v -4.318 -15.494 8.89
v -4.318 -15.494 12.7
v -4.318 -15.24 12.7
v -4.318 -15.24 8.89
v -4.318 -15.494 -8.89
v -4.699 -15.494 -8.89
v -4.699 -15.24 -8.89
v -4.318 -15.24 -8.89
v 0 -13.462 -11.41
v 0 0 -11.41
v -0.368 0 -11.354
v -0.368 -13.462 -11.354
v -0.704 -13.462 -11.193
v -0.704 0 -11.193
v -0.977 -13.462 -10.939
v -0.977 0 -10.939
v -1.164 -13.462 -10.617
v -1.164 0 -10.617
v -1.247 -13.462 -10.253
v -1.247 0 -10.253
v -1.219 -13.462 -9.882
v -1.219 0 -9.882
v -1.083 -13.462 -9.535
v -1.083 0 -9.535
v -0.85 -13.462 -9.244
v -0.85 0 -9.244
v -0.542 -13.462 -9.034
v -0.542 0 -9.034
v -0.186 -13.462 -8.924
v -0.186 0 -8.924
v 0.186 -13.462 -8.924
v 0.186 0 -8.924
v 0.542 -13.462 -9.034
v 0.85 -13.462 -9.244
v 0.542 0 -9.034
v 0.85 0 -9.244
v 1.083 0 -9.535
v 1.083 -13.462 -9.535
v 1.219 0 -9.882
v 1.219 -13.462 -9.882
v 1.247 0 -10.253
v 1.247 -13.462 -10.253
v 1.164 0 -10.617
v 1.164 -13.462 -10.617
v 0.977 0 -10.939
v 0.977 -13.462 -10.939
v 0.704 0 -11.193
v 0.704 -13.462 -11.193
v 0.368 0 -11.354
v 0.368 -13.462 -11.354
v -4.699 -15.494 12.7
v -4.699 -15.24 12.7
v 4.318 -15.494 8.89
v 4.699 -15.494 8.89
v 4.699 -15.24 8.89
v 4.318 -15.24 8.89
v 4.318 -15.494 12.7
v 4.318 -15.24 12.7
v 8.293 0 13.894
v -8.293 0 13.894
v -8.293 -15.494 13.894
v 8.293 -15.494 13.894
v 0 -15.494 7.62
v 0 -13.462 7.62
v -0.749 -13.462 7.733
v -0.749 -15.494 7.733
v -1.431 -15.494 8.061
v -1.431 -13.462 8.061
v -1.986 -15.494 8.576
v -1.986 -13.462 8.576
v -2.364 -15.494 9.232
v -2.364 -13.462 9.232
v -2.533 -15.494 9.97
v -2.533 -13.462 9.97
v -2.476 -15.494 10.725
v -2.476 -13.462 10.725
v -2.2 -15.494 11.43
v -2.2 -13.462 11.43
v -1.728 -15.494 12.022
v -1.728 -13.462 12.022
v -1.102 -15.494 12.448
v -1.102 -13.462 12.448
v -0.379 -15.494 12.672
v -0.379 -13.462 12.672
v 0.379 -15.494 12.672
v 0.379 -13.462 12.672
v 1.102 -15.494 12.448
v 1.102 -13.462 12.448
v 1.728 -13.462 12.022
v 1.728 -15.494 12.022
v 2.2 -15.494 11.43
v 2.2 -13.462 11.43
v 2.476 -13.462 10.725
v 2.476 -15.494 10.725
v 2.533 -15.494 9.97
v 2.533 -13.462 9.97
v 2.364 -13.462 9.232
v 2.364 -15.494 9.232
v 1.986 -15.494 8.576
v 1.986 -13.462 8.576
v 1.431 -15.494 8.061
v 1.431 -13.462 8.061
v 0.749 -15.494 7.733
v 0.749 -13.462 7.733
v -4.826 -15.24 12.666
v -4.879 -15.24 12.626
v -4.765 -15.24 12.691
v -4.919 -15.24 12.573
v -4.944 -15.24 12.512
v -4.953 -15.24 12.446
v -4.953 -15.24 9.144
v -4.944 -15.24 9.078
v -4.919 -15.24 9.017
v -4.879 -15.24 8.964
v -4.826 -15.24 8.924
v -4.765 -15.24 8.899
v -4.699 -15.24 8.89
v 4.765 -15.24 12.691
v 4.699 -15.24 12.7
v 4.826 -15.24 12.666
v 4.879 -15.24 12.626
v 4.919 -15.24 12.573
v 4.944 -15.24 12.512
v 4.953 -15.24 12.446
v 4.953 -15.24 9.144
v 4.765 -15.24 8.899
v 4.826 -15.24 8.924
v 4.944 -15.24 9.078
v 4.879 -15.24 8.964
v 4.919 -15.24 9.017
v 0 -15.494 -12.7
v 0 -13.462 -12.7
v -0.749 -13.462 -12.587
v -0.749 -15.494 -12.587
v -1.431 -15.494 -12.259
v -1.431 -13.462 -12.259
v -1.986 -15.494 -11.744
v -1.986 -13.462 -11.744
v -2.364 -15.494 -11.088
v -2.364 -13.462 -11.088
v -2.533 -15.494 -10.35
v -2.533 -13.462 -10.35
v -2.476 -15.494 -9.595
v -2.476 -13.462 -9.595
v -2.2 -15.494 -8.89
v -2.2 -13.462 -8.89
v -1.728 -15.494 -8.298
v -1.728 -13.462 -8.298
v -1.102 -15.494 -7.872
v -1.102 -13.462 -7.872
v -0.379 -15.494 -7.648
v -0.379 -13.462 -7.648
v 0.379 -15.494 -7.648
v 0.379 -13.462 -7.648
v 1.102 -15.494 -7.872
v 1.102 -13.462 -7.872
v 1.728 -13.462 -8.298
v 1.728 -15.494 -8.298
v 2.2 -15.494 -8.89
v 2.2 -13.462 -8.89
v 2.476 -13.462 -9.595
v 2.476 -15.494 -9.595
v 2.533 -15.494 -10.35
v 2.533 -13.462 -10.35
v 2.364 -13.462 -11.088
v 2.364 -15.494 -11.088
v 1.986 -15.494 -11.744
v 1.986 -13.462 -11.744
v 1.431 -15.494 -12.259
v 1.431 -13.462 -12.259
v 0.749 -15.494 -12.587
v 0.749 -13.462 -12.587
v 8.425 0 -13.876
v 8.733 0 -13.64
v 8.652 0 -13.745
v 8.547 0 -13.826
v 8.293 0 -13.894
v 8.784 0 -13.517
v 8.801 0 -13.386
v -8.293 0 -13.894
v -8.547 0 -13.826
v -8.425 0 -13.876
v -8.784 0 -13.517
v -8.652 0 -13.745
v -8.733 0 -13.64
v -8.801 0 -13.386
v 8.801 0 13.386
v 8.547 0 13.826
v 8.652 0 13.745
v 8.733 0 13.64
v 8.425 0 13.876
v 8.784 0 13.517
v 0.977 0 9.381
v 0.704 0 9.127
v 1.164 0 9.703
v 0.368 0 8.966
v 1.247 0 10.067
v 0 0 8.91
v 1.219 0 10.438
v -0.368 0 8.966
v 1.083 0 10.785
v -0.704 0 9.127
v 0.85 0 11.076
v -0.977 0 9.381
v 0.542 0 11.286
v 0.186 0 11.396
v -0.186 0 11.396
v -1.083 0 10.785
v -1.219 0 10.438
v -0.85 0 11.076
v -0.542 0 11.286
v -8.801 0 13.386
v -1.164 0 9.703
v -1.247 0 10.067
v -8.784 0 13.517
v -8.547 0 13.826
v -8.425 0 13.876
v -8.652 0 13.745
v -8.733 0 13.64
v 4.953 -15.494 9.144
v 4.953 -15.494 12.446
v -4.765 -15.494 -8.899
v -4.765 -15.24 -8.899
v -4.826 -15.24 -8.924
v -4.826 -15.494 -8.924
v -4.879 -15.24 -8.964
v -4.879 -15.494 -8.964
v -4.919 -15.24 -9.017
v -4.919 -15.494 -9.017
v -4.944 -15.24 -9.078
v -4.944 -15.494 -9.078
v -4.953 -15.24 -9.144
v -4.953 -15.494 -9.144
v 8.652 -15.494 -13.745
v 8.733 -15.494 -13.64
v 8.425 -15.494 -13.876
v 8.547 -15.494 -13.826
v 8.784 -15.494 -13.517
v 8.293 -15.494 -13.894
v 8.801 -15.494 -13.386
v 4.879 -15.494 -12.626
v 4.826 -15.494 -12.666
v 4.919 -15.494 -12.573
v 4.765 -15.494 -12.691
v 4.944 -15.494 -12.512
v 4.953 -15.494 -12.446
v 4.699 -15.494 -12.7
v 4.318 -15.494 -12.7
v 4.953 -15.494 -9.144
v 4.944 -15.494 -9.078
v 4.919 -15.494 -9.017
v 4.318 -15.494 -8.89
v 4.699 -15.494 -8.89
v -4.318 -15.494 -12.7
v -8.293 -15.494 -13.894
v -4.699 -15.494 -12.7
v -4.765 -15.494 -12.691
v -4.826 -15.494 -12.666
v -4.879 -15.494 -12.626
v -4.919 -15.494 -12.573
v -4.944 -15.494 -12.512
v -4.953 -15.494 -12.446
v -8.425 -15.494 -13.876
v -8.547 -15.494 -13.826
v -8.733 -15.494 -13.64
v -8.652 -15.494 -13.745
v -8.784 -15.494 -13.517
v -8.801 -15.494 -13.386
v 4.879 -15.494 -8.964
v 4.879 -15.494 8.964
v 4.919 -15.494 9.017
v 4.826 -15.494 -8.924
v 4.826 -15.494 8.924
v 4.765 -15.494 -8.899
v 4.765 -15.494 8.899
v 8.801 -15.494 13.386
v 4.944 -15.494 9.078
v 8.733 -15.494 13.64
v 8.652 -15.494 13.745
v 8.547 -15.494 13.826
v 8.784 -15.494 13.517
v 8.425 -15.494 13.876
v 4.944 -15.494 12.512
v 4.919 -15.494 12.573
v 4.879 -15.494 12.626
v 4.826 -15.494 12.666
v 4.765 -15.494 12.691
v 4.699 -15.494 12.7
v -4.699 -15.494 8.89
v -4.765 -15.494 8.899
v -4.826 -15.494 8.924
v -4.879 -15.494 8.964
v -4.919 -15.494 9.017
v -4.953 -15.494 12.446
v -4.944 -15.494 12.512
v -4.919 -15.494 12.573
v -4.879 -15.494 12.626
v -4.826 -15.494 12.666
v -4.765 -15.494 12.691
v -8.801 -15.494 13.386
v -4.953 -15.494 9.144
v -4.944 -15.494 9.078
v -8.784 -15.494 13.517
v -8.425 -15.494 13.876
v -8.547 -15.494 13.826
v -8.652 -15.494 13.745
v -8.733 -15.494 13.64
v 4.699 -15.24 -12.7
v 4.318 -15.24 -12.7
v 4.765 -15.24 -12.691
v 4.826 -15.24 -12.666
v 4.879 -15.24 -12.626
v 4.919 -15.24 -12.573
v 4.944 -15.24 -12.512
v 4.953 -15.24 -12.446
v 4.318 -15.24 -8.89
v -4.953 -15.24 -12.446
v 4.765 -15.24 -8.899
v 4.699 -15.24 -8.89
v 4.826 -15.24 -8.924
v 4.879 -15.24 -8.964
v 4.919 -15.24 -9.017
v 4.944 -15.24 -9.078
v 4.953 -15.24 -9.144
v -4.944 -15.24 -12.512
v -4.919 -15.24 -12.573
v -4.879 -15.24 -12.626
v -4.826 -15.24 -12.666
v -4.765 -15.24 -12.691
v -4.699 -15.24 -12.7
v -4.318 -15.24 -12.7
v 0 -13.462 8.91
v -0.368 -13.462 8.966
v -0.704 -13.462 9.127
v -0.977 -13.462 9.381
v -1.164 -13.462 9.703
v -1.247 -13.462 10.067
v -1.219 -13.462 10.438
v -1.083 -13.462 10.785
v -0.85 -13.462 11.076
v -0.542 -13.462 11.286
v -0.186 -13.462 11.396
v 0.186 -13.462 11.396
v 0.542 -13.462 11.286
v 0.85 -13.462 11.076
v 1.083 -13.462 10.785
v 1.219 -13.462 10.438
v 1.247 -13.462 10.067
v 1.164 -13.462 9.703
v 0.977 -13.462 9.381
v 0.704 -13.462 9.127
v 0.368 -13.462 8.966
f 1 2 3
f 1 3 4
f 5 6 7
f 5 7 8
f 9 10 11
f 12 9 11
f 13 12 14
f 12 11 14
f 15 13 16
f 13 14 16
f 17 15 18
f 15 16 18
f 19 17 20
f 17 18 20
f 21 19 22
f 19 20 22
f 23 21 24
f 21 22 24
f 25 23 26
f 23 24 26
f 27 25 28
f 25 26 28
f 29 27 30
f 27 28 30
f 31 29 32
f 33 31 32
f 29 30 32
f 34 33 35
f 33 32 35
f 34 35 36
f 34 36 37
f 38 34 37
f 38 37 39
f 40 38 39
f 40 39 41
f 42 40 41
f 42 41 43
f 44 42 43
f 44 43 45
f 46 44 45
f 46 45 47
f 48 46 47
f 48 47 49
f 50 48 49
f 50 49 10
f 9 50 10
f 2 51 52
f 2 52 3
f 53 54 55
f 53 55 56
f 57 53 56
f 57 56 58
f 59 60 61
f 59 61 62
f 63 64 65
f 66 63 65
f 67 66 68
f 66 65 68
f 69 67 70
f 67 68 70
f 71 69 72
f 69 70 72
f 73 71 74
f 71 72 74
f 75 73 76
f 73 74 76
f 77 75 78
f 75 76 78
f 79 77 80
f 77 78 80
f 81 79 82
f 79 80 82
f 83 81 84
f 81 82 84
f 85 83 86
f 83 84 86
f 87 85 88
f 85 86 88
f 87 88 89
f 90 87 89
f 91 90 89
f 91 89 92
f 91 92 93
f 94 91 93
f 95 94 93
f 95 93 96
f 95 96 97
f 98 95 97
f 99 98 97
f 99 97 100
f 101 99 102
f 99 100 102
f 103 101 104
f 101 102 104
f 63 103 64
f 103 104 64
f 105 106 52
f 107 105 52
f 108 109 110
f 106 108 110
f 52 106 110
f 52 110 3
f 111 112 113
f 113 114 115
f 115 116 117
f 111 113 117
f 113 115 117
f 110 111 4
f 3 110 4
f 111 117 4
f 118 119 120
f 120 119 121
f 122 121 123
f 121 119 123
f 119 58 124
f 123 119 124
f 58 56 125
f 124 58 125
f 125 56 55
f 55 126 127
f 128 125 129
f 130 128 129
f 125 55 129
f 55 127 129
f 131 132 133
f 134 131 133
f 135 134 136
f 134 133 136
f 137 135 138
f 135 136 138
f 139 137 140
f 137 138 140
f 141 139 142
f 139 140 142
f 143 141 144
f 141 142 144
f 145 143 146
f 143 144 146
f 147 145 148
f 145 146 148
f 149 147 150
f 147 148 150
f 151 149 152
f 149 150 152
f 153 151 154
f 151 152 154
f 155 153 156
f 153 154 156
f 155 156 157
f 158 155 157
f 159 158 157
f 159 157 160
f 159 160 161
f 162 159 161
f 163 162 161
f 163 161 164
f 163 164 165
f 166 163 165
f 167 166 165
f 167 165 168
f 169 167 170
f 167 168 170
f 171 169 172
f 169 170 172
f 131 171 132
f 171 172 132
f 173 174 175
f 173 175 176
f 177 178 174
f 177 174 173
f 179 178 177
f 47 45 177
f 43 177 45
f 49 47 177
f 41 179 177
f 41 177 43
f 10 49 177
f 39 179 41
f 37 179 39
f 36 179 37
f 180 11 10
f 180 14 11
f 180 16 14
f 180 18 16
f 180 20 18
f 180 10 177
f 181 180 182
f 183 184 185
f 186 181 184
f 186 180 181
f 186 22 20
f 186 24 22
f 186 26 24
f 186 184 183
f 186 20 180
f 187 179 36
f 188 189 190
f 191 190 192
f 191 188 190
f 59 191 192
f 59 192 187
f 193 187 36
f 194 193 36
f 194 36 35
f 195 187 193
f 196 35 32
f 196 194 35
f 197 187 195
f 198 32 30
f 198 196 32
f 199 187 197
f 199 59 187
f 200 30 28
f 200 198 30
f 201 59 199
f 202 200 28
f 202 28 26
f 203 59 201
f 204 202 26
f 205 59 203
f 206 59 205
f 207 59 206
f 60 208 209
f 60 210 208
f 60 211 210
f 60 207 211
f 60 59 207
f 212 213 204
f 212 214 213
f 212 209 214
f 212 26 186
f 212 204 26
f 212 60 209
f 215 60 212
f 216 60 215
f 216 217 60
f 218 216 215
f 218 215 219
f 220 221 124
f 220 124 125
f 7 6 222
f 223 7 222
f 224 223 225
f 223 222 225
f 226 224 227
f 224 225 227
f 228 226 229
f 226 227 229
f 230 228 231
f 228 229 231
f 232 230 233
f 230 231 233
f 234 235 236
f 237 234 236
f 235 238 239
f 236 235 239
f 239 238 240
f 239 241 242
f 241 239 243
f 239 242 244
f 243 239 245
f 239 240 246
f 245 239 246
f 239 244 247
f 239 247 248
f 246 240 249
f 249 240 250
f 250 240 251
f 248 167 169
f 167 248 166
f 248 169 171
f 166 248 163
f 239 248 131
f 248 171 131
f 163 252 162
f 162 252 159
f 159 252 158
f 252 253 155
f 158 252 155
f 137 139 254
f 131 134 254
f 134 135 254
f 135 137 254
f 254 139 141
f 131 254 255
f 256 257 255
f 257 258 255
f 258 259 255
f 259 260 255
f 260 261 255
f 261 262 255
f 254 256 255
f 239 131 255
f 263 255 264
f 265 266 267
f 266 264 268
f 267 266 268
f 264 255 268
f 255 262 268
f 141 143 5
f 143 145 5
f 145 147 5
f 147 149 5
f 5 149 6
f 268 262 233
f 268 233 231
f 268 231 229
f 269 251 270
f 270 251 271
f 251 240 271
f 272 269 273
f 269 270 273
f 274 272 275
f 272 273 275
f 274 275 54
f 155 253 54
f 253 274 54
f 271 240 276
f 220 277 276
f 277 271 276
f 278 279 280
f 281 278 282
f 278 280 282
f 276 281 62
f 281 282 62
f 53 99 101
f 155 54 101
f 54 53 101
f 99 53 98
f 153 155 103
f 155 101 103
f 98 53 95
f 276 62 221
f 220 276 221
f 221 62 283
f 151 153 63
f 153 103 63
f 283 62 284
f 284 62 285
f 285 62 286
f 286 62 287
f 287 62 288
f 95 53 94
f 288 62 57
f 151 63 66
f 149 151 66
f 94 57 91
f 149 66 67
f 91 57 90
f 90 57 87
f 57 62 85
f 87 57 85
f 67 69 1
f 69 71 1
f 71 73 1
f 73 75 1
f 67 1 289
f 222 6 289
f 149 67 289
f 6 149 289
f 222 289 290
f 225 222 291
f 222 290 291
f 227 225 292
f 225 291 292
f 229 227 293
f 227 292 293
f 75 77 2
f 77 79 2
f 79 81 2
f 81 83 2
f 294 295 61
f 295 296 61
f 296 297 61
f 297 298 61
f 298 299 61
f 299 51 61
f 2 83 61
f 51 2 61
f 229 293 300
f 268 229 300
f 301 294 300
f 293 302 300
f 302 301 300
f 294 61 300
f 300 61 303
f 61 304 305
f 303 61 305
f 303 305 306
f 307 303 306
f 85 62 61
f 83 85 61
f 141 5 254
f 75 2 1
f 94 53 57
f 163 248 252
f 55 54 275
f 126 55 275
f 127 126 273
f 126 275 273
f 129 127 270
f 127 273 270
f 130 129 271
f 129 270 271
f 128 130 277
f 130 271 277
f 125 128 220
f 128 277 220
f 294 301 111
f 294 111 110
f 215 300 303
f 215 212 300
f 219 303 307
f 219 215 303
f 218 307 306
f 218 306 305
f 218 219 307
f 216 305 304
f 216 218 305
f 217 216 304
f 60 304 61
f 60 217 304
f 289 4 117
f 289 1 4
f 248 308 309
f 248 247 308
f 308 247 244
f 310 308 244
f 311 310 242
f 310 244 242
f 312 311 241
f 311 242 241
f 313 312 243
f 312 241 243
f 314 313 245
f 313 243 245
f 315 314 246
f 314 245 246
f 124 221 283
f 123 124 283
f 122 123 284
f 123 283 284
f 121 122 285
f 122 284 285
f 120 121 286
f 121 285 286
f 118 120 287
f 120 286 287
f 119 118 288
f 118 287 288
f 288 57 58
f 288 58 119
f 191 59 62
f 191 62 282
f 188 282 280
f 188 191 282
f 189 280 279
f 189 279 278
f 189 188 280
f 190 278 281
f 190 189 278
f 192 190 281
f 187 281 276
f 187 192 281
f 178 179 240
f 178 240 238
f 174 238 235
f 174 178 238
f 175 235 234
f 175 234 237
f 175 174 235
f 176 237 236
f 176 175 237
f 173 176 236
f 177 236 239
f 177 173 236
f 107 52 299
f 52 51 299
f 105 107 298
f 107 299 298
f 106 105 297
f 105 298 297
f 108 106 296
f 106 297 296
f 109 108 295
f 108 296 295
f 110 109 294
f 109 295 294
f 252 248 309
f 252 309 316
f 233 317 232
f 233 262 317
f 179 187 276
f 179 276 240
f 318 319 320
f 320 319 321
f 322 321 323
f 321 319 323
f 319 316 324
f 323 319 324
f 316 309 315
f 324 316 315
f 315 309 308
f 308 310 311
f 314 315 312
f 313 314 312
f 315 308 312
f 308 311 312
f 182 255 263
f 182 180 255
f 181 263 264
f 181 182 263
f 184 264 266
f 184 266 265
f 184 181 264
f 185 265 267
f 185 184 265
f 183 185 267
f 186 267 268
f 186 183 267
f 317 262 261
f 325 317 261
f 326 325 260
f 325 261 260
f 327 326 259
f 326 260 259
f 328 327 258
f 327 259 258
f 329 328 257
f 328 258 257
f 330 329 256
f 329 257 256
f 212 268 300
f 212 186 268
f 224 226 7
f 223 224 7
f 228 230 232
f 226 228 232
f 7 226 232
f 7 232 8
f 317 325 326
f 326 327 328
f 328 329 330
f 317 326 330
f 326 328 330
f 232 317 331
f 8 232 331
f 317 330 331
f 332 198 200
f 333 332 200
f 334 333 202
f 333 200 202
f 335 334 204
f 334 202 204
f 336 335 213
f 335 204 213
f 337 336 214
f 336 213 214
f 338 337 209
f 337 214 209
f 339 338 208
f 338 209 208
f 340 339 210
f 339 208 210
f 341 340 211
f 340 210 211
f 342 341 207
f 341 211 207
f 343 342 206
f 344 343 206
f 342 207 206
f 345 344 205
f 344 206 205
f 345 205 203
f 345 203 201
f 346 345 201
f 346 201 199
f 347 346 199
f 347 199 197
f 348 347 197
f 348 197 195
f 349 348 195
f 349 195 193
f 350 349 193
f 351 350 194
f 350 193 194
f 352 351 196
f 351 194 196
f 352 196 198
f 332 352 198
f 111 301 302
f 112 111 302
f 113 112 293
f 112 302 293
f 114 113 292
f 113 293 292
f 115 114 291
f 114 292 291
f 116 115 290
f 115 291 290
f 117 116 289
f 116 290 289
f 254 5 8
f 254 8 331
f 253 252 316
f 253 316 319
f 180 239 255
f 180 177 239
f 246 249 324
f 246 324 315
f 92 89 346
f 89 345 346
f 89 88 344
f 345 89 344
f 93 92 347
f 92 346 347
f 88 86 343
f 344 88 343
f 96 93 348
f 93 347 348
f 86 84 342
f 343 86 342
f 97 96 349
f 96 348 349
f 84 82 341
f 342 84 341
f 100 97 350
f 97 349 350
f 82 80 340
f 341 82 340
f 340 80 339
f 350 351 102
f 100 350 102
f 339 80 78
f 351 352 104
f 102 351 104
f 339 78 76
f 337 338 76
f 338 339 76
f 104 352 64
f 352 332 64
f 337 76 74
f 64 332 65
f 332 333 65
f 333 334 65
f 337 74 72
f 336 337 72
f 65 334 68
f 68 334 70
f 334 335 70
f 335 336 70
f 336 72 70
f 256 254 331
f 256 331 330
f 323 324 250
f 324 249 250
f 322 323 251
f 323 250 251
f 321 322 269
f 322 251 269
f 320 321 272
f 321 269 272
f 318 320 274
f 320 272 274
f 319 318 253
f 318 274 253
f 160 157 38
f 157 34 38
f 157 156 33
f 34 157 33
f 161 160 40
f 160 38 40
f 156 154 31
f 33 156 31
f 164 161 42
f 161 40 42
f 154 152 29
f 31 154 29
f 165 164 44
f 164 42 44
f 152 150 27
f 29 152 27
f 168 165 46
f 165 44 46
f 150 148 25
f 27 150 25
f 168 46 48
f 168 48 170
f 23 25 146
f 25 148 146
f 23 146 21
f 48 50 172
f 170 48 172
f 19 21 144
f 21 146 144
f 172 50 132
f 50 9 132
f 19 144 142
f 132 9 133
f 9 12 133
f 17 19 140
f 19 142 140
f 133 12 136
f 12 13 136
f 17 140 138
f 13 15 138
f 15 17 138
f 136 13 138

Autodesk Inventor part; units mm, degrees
sketch "Sketch_1" plane through (0, 0, 0) normal (0, 1, 0) x (-1, 0, 0)
  line L0 (8.8011, -13.3858) -> (8.8011, 13.3858)
  arc A0 (8.8011, 13.3858) -> (8.2931, 13.8938) centre (8.2931, 13.3858) ccw
  line L1 (8.2931, 13.8938) -> (-8.2931, 13.8938)
  arc A1 (-8.2931, 13.8938) -> (-8.8011, 13.3858) centre (-8.2931, 13.3858) ccw
  line L2 (-8.8011, 13.3858) -> (-8.8011, -13.3858)
  arc A2 (-8.8011, -13.3858) -> (-8.2931, -13.8938) centre (-8.2931, -13.3858) ccw
  line L3 (-8.2931, -13.8938) -> (8.2931, -13.8938)
  arc A3 (8.2931, -13.8938) -> (8.8011, -13.3858) centre (8.2931, -13.3858) ccw
extrude "Extrusion1" add sketch "Sketch_1" against normal blind 15.494
sketch "Sketch_2" plane through (0, -15.494, 0) normal (0, 1, 0) x (1, 0, 0)
  arc A0 (-4.953, -12.446) -> (-4.699, -12.7) centre (-4.699, -12.446) ccw
  line L0 (-4.699, -12.7) -> (-4.318, -12.7)
  line L1 (-4.318, -12.7) -> (-4.318, -8.89)
  line L2 (-4.318, -8.89) -> (-4.699, -8.89)
  arc A1 (-4.699, -8.89) -> (-4.953, -9.144) centre (-4.699, -9.144) ccw
  line L3 (-4.953, -9.144) -> (-4.953, -12.446)
extrude "Extrusion2" cut sketch "Sketch_2" along normal blind 0.254
sketch "Sketch_3" plane through (0, -15.494, 0) normal (0, 1, 0) x (1, 0, 0)
  line L0 (4.318, -12.7) -> (4.699, -12.7)
  arc A0 (4.699, -12.7) -> (4.953, -12.446) centre (4.699, -12.446) ccw
  line L1 (4.953, -12.446) -> (4.953, -9.144)
  arc A1 (4.953, -9.144) -> (4.699, -8.89) centre (4.699, -9.144) ccw
  line L2 (4.699, -8.89) -> (4.318, -8.89)
  line L3 (4.318, -8.89) -> (4.318, -12.7)
extrude "Extrusion3" cut sketch "Sketch_3" along normal blind 0.254
sketch "Sketch_4" plane through (0, -15.494, 0) normal (0, 1, 0) x (1, 0, 0)
  line L0 (-4.953, 12.446) -> (-4.953, 9.144)
  arc A0 (-4.953, 9.144) -> (-4.699, 8.89) centre (-4.699, 9.144) ccw
  line L1 (-4.699, 8.89) -> (-4.318, 8.89)
  line L2 (-4.318, 8.89) -> (-4.318, 12.7)
  line L3 (-4.318, 12.7) -> (-4.699, 12.7)
  arc A1 (-4.699, 12.7) -> (-4.953, 12.446) centre (-4.699, 12.446) ccw
extrude "Extrusion4" cut sketch "Sketch_4" along normal blind 0.254
sketch "Sketch_5" plane through (0, -15.494, 0) normal (0, 1, 0) x (1, 0, 0)
  line L0 (4.318, 12.7) -> (4.318, 8.89)
  line L1 (4.318, 8.89) -> (4.699, 8.89)
  arc A0 (4.699, 8.89) -> (4.953, 9.144) centre (4.699, 9.144) ccw
  line L2 (4.953, 9.144) -> (4.953, 12.446)
  arc A1 (4.953, 12.446) -> (4.699, 12.7) centre (4.699, 12.446) ccw
  line L3 (4.699, 12.7) -> (4.318, 12.7)
extrude "Extrusion5" cut sketch "Sketch_5" along normal blind 0.254
sketch "Sketch6" plane through (0, -15.494, 0) normal (0, -1, 0) x (1, 0, 0)
  point P0 (0, 10.16)
hole "Drilling 1" at (0, -15.494, 10.16) direction (0, 1, 0) diameter 2.5 depth 15.494 counterbore diameter 5.08 counterbore depth 2.032
sketch "Sketch7" plane through (0, -15.494, 0) normal (0, -1, 0) x (1, 0, 0)
  point P0 (0, -10.16)
hole "Drilling 2" at (0, -15.494, -10.16) direction (0, 1, 0) diameter 2.5 depth 15.494 counterbore diameter 5.08 counterbore depth 2.032
ref_plane "screw_m25_2_XY" through (0, -13.462, -10.16) normal (0, 1, 0) x (1, 0, 0)
ref_plane "screw_m25_2_YZ" through (0, -13.462, -10.16) normal (1, 0, 0) x (0, 0, -1)
ref_plane "screw_m25_2_ZX" through (0, -13.462, -10.16) normal (0, 0, -1) x (0, 1, 0)
ref_plane "sscrew_m25_1_XY" through (0, -13.462, 10.16) normal (0, 1, 0) x (1, 0, 0)
ref_plane "sscrew_m25_1_YZ" through (0, -13.462, 10.16) normal (1, 0, 0) x (0, 0, -1)
ref_plane "sscrew_m25_1_ZX" through (0, -13.462, 10.16) normal (0, 0, -1) x (0, 1, 0)
ref_plane "to_dummy_XY" through (0, 0, 0) normal (0, -1, 0) x (1, 0, 0)
ref_plane "to_dummy_YZ" through (0, 0, 0) normal (1, 0, 0) x (0, 0, 1)
ref_plane "to_dummy_ZX" through (0, 0, 0) normal (0, 0, 1) x (0, -1, 0)
ref_plane "to_electric_XY" through (0, -15.24, 0) normal (0, 1, 0) x (1, 0, 0)
ref_plane "to_electric_YZ" through (0, -15.24, 0) normal (1, 0, 0) x (0, 0, -1)
ref_plane "to_electric_ZX" through (0, -15.24, 0) normal (0, 0, -1) x (0, 1, 0)
ref_plane "to_panel_XY" through (0, 0, 0) normal (0, -1, 0) x (1, 0, 0)
ref_plane "to_panel_YZ" through (0, 0, 0) normal (1, 0, 0) x (0, 0, 1)
ref_plane "to_panel_ZX" through (0, 0, 0) normal (0, 0, 1) x (0, -1, 0)
properties part number "S114-body"
